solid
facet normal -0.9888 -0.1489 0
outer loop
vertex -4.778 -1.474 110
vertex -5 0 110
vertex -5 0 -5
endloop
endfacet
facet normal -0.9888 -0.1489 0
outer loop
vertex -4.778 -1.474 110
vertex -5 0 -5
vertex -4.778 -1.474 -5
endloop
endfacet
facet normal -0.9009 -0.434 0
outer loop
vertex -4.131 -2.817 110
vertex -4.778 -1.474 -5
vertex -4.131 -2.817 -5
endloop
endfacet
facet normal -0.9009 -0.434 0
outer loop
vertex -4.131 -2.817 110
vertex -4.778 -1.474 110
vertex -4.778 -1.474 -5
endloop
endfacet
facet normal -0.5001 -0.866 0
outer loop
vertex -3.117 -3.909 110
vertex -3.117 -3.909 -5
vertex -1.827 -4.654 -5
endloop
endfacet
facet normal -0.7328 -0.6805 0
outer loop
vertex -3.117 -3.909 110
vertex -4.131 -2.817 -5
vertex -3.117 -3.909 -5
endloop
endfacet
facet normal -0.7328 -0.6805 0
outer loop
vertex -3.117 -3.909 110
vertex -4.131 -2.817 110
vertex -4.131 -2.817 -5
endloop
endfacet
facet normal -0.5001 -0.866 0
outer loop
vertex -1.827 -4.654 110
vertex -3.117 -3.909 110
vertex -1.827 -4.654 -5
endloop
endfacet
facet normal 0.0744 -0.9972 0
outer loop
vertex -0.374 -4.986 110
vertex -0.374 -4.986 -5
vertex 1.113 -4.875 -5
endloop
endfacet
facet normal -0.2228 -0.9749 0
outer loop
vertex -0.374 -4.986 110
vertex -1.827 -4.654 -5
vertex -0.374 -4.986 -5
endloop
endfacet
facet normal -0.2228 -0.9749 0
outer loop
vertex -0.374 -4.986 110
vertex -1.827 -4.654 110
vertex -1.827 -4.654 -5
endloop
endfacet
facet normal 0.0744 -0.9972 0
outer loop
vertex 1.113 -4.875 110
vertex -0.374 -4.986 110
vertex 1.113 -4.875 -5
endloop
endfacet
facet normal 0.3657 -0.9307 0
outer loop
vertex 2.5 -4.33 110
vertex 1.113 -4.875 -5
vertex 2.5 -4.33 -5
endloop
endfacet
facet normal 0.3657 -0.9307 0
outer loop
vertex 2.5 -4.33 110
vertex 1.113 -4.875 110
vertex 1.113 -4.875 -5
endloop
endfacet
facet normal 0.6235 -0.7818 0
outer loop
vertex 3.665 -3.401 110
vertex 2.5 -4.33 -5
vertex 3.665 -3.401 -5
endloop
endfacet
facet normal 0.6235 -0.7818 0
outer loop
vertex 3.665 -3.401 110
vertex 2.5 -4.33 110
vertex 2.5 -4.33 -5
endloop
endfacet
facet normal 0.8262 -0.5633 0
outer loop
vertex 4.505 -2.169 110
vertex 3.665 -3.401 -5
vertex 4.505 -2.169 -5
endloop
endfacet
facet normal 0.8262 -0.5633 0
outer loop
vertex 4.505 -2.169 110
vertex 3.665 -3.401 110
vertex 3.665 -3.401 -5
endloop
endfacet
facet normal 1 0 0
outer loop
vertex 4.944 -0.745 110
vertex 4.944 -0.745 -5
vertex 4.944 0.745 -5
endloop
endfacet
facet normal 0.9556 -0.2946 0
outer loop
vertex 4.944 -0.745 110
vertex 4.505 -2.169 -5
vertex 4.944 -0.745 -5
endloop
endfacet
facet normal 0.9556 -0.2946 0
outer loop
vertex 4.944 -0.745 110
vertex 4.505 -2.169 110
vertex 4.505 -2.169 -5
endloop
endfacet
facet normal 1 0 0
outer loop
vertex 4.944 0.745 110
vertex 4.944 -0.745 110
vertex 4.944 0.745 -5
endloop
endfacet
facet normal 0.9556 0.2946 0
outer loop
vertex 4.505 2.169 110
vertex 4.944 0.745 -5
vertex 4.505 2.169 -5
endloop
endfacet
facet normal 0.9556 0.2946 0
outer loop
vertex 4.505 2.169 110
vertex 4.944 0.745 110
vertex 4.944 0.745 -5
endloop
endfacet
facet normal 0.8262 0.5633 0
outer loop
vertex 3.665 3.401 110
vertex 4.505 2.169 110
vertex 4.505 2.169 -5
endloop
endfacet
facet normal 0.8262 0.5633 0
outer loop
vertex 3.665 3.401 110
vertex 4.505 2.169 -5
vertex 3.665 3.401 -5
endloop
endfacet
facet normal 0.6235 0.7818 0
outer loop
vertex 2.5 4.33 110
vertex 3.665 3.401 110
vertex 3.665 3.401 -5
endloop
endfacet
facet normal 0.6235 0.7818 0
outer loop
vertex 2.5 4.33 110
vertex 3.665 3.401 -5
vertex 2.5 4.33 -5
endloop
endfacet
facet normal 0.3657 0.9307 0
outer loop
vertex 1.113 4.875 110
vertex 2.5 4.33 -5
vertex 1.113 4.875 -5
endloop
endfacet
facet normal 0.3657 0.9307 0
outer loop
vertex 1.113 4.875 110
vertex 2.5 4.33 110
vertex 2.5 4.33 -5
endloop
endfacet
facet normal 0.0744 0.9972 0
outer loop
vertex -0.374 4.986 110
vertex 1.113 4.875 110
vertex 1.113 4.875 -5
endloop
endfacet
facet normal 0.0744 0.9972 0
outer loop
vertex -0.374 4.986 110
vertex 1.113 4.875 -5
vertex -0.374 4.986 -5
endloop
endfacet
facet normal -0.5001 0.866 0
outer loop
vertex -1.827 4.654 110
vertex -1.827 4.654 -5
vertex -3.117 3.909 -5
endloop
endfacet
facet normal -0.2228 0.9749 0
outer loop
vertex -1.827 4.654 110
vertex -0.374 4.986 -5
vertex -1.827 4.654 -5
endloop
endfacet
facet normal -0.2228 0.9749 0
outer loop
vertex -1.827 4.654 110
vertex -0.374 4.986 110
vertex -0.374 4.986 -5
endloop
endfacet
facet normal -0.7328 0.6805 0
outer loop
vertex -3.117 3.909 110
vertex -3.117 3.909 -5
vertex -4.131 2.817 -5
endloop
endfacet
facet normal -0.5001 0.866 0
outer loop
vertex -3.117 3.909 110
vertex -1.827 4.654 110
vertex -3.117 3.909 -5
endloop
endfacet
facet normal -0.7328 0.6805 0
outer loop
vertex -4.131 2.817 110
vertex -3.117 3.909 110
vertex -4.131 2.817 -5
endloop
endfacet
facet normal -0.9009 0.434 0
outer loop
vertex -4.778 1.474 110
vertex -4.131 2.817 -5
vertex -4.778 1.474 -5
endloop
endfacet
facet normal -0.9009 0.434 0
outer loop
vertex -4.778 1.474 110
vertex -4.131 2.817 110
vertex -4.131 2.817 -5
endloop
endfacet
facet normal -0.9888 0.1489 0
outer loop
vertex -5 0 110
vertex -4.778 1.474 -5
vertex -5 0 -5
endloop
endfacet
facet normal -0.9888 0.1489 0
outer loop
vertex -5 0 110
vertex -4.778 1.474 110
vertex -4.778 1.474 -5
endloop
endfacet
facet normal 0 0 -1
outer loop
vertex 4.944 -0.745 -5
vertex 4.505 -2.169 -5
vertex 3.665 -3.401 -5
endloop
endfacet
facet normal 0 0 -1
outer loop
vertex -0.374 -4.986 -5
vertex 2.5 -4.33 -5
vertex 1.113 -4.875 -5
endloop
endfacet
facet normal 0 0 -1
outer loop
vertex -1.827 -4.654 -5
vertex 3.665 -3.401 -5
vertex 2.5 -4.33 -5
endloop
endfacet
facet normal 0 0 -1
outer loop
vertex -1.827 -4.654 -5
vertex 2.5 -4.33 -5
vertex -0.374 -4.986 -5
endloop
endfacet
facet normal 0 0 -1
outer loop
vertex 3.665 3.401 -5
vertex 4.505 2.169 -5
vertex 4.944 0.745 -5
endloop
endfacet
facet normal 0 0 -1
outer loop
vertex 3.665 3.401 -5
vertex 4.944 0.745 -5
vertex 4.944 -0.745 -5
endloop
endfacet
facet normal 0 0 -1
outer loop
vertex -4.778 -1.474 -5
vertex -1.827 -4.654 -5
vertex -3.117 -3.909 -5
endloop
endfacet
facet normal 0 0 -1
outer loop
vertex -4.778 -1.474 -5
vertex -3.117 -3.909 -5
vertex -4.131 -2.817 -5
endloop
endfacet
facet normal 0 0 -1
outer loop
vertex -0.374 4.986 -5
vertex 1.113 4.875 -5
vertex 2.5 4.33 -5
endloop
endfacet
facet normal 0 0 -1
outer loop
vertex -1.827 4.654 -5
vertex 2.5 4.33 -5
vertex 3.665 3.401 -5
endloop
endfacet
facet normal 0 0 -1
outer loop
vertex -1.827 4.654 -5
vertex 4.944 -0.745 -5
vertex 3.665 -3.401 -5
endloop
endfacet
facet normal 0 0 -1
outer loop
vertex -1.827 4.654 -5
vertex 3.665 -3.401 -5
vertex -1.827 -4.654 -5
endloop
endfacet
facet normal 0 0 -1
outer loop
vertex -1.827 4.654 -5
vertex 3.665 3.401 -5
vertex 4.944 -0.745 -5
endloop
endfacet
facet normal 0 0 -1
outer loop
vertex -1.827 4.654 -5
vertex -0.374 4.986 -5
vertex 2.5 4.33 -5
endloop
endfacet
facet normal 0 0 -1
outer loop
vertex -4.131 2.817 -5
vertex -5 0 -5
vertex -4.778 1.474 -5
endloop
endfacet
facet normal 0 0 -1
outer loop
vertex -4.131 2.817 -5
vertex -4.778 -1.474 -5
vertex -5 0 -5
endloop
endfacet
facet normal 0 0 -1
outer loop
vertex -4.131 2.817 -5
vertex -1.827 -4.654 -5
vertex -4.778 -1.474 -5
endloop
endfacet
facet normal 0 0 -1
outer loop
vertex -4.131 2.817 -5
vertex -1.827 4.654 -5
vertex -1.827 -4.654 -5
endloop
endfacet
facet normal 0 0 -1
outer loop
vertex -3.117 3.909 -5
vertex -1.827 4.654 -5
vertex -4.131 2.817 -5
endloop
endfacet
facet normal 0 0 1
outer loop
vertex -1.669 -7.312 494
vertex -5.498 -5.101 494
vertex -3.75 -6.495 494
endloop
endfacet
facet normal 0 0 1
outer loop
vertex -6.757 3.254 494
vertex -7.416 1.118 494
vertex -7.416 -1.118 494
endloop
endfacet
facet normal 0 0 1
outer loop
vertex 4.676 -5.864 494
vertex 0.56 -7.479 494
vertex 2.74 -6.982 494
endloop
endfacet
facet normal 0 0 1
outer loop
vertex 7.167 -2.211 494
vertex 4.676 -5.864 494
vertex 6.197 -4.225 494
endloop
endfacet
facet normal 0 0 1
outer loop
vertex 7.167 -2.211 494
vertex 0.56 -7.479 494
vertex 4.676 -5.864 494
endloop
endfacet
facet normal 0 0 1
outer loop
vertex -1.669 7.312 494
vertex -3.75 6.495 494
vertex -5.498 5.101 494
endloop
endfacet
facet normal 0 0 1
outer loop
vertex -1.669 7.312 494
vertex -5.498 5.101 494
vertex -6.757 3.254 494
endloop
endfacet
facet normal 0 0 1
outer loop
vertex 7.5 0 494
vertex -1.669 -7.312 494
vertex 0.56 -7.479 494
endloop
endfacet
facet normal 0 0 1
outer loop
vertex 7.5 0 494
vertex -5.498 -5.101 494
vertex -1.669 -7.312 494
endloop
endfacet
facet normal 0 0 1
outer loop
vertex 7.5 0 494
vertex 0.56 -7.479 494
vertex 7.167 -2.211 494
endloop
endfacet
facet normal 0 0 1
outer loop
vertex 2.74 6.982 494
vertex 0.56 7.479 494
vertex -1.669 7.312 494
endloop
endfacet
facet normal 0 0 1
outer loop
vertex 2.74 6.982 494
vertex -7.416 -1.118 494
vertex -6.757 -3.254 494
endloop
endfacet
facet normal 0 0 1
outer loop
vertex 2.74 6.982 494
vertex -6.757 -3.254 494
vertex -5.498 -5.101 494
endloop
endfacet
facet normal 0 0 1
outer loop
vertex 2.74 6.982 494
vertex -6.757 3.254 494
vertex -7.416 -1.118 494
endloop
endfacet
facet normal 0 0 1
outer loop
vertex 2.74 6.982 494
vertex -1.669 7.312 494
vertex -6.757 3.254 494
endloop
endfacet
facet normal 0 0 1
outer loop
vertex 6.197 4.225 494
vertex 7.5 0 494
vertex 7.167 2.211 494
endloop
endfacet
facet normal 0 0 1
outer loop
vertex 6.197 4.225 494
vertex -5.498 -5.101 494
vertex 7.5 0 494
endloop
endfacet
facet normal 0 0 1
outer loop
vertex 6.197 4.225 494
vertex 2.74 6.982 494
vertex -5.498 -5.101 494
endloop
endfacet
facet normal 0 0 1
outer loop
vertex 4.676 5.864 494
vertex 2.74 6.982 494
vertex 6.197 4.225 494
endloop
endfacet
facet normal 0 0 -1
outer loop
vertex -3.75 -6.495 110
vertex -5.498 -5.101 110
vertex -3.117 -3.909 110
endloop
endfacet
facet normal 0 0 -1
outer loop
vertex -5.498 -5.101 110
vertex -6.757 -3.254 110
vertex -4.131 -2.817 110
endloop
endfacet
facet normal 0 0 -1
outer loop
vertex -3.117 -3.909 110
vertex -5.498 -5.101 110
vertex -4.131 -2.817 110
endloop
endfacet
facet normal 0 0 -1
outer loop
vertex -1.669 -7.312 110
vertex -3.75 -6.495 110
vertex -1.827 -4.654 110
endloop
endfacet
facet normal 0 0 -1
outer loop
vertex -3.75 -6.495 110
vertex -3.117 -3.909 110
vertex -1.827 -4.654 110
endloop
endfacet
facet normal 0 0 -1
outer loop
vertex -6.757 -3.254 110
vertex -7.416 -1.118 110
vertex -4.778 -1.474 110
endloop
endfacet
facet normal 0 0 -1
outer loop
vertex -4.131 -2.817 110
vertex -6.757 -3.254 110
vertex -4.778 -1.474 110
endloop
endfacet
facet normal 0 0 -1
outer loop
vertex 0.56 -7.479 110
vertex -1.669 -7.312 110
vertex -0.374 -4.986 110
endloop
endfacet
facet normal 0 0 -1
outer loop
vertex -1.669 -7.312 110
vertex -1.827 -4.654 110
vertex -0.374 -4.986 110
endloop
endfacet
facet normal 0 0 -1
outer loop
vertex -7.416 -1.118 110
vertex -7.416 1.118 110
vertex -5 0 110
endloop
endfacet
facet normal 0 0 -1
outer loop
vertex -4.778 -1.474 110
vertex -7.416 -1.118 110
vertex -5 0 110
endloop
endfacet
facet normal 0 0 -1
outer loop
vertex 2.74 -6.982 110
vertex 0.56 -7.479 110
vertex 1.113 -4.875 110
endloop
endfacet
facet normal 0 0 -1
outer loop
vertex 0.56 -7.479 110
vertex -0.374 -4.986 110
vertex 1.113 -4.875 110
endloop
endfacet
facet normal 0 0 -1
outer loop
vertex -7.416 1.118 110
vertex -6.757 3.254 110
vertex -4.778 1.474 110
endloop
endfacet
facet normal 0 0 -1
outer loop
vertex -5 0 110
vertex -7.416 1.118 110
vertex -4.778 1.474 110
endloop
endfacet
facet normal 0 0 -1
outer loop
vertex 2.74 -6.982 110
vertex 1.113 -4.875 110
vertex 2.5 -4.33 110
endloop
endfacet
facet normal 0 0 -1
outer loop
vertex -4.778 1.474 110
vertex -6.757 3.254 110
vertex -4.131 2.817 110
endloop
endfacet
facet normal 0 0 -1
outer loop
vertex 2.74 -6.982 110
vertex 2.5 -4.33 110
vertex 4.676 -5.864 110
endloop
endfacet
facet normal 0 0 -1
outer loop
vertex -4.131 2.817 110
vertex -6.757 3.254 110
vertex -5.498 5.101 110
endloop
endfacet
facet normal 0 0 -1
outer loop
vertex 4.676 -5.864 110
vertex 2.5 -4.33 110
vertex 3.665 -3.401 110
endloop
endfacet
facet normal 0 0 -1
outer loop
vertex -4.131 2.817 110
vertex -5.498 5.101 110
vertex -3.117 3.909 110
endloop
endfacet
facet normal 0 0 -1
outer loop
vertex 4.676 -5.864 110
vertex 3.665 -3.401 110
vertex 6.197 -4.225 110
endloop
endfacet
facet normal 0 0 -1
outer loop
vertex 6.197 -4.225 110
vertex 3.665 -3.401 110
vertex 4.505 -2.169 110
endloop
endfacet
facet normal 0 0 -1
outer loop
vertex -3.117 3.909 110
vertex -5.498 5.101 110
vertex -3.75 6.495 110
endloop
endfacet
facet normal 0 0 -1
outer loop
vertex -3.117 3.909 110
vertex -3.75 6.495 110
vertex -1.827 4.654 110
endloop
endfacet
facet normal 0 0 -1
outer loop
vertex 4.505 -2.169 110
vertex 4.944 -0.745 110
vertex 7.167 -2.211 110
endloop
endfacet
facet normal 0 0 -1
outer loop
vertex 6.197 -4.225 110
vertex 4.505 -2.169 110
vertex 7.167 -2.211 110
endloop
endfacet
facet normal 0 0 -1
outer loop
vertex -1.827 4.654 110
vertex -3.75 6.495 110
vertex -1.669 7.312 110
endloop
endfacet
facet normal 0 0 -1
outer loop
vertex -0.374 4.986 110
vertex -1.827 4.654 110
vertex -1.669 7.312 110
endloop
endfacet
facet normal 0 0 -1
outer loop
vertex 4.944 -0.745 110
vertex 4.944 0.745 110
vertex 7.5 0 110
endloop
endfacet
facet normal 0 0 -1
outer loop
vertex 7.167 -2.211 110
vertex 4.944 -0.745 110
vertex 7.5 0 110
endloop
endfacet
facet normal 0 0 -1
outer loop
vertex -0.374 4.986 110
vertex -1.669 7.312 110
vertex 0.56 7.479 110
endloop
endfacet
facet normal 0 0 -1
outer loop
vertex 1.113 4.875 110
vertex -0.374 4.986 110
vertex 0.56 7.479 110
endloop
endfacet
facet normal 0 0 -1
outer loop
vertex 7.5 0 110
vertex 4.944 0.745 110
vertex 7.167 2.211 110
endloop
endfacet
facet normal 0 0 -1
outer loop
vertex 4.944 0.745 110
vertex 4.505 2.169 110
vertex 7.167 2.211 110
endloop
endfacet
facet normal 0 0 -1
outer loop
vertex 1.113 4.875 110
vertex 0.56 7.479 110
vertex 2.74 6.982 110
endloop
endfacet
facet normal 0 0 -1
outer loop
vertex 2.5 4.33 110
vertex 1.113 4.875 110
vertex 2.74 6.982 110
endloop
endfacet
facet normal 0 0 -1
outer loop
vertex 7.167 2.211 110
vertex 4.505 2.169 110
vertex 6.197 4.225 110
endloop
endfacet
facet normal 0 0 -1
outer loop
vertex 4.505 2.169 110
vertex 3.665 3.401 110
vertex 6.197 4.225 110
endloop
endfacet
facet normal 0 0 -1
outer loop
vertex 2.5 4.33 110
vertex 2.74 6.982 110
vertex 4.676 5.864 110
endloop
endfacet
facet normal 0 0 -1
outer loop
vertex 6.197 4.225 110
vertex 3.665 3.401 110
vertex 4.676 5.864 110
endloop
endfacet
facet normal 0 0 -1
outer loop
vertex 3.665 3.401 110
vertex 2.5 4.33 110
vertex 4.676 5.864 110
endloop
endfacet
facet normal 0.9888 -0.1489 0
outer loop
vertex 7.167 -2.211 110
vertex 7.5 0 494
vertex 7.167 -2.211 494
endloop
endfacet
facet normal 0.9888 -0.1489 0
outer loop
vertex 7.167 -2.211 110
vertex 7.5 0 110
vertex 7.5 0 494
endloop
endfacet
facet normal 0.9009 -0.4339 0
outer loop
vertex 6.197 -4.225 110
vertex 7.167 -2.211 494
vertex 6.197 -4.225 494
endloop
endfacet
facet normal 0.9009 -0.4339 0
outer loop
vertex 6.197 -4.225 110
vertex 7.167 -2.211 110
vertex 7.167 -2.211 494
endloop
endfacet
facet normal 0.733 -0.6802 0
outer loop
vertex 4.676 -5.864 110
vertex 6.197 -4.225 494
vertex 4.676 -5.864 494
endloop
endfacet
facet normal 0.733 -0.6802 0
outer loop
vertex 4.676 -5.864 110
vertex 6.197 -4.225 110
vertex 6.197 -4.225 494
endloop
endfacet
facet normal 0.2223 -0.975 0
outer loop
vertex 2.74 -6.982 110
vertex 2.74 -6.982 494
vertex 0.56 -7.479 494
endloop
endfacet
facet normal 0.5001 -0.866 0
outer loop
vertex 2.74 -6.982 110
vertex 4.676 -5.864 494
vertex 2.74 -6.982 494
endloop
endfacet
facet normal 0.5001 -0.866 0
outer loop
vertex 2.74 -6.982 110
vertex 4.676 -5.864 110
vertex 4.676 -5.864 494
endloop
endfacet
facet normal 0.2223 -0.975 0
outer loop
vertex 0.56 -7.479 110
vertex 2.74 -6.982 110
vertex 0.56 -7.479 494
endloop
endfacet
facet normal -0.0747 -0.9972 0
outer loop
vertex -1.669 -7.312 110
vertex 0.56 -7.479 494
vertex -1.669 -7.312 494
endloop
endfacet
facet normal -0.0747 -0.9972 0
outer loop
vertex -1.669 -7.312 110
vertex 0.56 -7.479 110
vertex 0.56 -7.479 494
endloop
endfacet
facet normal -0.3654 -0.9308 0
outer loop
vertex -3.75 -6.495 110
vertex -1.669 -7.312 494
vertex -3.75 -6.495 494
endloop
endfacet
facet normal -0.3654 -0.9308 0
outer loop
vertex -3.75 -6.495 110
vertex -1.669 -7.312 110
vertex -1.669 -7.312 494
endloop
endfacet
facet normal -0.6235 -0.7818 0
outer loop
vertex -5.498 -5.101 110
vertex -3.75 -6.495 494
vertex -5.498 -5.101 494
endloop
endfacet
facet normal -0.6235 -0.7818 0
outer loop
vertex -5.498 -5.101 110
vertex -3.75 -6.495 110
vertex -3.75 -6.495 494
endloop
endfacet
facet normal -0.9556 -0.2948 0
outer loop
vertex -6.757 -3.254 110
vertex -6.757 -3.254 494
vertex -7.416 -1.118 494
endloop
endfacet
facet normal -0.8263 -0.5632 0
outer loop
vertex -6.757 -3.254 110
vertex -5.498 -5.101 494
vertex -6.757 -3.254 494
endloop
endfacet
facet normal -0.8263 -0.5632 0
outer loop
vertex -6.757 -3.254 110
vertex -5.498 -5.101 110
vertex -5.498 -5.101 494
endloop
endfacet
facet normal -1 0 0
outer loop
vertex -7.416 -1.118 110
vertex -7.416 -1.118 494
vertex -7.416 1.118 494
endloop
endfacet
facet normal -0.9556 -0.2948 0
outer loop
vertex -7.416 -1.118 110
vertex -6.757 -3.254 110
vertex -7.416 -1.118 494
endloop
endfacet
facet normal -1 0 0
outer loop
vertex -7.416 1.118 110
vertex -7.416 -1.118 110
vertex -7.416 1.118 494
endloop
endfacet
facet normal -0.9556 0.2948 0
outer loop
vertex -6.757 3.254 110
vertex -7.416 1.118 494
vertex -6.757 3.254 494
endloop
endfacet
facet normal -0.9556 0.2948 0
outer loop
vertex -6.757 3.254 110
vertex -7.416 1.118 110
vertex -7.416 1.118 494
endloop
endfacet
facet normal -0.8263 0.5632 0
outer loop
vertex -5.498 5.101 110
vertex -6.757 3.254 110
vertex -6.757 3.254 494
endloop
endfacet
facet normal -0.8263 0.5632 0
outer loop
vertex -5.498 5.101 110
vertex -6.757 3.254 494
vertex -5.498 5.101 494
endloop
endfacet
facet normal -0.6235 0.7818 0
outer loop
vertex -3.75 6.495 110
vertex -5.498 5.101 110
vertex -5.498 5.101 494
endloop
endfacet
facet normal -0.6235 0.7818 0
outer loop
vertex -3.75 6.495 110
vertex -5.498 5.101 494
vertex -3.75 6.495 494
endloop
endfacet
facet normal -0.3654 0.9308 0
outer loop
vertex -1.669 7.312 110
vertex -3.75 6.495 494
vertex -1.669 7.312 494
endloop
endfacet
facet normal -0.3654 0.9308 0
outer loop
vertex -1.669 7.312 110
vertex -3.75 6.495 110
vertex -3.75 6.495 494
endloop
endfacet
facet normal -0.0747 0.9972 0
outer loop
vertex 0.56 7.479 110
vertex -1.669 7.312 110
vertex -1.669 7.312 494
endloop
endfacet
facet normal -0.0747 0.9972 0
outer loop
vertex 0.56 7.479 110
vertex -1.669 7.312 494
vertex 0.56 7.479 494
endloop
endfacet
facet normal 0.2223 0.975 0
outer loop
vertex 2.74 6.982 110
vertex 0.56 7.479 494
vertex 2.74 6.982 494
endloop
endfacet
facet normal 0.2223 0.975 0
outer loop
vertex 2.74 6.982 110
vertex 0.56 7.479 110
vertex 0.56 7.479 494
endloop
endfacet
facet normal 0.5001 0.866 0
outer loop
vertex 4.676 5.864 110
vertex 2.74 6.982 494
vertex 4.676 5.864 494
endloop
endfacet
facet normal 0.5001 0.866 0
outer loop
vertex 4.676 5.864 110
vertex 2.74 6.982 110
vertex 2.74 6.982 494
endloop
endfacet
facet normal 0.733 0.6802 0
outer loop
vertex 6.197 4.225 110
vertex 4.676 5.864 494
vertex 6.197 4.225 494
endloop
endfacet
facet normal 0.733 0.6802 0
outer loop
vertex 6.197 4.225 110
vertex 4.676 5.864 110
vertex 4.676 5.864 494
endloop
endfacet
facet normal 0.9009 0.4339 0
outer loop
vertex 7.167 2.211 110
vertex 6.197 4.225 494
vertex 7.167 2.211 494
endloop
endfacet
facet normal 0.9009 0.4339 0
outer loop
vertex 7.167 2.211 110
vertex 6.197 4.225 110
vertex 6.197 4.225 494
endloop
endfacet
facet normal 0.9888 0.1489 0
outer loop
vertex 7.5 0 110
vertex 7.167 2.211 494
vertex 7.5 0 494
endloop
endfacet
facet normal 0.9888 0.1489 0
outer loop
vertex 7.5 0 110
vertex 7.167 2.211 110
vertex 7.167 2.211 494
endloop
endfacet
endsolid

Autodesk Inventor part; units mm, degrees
ref_plane "YZ Plane" through (0, 0, 0) normal (1, 0, 0) x (0, 1, 0)
ref_plane "XZ Plane" through (0, 0, 0) normal (0, 1, 0) x (-1, 0, 0)
ref_plane "XY Plane" through (0, 0, 0) normal (0, 0, 1) x (1, 0, 0)
sketch "Sketch1" plane through (0, 0, 0) normal (0, 0, 1) x (1, 0, 0)
  circle A0 centre (0, 0) radius 25
  dimension "d0" = 50
extrude "Extrusion1" add sketch "Sketch1" along normal blind 10
sketch "Sketch2" plane through (0, 0, 10) normal (0, 0, 1) x (1, 0, 0)
  circle A0 centre (0, 0) radius 6.5
  dimension "d3" = 13
extrude "Extrusion2" add sketch "Sketch2" along normal blind 100
fillet "Fillet1" radius 1 1 edges at (-6.5, 0, 10)
sketch "Sketch4" plane through (0, 0, 0) normal (0, 0, -1) x (-1, 0, 0)
  arc A0 (19.3649, 5) -> (5, 19.3649) centre (0, 0) ccw
  line L0 (2.5, 17.4284) -> (2.5, 9.4868)
  line L1 (9.4868, 2.5) -> (17.4284, 2.5)
  arc A1 (5, 19.3649) -> (2.5, 17.4284) centre (4.5, 17.4284) ccw
  arc A2 (17.4284, 2.5) -> (19.3649, 5) centre (17.4284, 4.5) ccw
  arc A3 (2.5, 8.3666) -> (2.5153, 8.1193) centre (4.5, 8.3666) ccw
  arc A4 (8.1193, 2.5153) -> (8.3666, 2.5) centre (8.3666, 4.5) ccw
  arc A5 (7.6798, 3.6429) -> (3.6429, 7.6798) centre (0, 0) ccw
  arc A6 (2.5, 9.4868) -> (3.6429, 7.6798) centre (4.5, 9.4868) ccw
  arc A7 (7.6798, 3.6429) -> (9.4868, 2.5) centre (9.4868, 4.5) ccw
  point P0 (2.5, 19.8431)
  point P1 (19.8431, 2.5)
  point P2 (2.5, 7.0711)
  point P3 (7.0711, 2.5)
extrude "Extrusion3" cut sketch "Sketch4" against normal blind 10
pattern_circular "Circular Pattern1" count 4 over 360 about axis through (0, 0, 11) along (0, 0, -1) of "Extrusion3"
sketch "Sketch7" plane through (0, 0, 110) normal (0, 0, 1) x (1, 0, 0)
  circle A0 centre (0, 0) radius 7.5
  dimension "d38" = 15
extrude "Extrusion5" add sketch "Sketch7" along normal blind 384
sketch "Sketch8" plane through (0, 0, 494) normal (0, 0, 1) x (1, 0, 0)
  circle A0 centre (0, 0) radius 6.5
  dimension "d41" = 13
extrude "Extrusion6" add sketch "Sketch8" along normal blind 10
sketch "Sketch9" plane through (0, 0, 504) normal (0, 0, 1) x (1, 0, 0)
  circle A0 centre (0, 0) radius 10
  dimension "d44" = 20
extrude "Extrusion7" add sketch "Sketch9" along normal blind 2.5
thread "Thread1" size "M15x1.5" class "6g" standard "ANSI Metric M Profile" length 417
sketch "Sketch10" plane through (0, 0, 506.5) normal (0, 0, 1) x (1, 0, 0)
  circle A0 centre (0, 0) radius 10
extrude "Extrusion8" cut sketch "Sketch10" against normal blind 12.5
sketch "Sketch11" plane through (0, 0, 0) normal (0, 0, -1) x (-1, 0, 0)
  circle A0 centre (0, 0) radius 25 projected
  circle A1 centre (0, 0) radius 25
extrude "Extrusion9" cut sketch "Sketch11" against normal blind 110
sketch "Sketch12" plane through (0, 0, 110) normal (0, 0, -1) x (-1, 0, 0)
  circle A0 centre (0, 0) radius 5
  dimension "d53" = 10
extrude "Extrusion10" add sketch "Sketch12" along normal blind 115
properties part number "leadscrew_latest_Y" material "Steel, Alloy"
